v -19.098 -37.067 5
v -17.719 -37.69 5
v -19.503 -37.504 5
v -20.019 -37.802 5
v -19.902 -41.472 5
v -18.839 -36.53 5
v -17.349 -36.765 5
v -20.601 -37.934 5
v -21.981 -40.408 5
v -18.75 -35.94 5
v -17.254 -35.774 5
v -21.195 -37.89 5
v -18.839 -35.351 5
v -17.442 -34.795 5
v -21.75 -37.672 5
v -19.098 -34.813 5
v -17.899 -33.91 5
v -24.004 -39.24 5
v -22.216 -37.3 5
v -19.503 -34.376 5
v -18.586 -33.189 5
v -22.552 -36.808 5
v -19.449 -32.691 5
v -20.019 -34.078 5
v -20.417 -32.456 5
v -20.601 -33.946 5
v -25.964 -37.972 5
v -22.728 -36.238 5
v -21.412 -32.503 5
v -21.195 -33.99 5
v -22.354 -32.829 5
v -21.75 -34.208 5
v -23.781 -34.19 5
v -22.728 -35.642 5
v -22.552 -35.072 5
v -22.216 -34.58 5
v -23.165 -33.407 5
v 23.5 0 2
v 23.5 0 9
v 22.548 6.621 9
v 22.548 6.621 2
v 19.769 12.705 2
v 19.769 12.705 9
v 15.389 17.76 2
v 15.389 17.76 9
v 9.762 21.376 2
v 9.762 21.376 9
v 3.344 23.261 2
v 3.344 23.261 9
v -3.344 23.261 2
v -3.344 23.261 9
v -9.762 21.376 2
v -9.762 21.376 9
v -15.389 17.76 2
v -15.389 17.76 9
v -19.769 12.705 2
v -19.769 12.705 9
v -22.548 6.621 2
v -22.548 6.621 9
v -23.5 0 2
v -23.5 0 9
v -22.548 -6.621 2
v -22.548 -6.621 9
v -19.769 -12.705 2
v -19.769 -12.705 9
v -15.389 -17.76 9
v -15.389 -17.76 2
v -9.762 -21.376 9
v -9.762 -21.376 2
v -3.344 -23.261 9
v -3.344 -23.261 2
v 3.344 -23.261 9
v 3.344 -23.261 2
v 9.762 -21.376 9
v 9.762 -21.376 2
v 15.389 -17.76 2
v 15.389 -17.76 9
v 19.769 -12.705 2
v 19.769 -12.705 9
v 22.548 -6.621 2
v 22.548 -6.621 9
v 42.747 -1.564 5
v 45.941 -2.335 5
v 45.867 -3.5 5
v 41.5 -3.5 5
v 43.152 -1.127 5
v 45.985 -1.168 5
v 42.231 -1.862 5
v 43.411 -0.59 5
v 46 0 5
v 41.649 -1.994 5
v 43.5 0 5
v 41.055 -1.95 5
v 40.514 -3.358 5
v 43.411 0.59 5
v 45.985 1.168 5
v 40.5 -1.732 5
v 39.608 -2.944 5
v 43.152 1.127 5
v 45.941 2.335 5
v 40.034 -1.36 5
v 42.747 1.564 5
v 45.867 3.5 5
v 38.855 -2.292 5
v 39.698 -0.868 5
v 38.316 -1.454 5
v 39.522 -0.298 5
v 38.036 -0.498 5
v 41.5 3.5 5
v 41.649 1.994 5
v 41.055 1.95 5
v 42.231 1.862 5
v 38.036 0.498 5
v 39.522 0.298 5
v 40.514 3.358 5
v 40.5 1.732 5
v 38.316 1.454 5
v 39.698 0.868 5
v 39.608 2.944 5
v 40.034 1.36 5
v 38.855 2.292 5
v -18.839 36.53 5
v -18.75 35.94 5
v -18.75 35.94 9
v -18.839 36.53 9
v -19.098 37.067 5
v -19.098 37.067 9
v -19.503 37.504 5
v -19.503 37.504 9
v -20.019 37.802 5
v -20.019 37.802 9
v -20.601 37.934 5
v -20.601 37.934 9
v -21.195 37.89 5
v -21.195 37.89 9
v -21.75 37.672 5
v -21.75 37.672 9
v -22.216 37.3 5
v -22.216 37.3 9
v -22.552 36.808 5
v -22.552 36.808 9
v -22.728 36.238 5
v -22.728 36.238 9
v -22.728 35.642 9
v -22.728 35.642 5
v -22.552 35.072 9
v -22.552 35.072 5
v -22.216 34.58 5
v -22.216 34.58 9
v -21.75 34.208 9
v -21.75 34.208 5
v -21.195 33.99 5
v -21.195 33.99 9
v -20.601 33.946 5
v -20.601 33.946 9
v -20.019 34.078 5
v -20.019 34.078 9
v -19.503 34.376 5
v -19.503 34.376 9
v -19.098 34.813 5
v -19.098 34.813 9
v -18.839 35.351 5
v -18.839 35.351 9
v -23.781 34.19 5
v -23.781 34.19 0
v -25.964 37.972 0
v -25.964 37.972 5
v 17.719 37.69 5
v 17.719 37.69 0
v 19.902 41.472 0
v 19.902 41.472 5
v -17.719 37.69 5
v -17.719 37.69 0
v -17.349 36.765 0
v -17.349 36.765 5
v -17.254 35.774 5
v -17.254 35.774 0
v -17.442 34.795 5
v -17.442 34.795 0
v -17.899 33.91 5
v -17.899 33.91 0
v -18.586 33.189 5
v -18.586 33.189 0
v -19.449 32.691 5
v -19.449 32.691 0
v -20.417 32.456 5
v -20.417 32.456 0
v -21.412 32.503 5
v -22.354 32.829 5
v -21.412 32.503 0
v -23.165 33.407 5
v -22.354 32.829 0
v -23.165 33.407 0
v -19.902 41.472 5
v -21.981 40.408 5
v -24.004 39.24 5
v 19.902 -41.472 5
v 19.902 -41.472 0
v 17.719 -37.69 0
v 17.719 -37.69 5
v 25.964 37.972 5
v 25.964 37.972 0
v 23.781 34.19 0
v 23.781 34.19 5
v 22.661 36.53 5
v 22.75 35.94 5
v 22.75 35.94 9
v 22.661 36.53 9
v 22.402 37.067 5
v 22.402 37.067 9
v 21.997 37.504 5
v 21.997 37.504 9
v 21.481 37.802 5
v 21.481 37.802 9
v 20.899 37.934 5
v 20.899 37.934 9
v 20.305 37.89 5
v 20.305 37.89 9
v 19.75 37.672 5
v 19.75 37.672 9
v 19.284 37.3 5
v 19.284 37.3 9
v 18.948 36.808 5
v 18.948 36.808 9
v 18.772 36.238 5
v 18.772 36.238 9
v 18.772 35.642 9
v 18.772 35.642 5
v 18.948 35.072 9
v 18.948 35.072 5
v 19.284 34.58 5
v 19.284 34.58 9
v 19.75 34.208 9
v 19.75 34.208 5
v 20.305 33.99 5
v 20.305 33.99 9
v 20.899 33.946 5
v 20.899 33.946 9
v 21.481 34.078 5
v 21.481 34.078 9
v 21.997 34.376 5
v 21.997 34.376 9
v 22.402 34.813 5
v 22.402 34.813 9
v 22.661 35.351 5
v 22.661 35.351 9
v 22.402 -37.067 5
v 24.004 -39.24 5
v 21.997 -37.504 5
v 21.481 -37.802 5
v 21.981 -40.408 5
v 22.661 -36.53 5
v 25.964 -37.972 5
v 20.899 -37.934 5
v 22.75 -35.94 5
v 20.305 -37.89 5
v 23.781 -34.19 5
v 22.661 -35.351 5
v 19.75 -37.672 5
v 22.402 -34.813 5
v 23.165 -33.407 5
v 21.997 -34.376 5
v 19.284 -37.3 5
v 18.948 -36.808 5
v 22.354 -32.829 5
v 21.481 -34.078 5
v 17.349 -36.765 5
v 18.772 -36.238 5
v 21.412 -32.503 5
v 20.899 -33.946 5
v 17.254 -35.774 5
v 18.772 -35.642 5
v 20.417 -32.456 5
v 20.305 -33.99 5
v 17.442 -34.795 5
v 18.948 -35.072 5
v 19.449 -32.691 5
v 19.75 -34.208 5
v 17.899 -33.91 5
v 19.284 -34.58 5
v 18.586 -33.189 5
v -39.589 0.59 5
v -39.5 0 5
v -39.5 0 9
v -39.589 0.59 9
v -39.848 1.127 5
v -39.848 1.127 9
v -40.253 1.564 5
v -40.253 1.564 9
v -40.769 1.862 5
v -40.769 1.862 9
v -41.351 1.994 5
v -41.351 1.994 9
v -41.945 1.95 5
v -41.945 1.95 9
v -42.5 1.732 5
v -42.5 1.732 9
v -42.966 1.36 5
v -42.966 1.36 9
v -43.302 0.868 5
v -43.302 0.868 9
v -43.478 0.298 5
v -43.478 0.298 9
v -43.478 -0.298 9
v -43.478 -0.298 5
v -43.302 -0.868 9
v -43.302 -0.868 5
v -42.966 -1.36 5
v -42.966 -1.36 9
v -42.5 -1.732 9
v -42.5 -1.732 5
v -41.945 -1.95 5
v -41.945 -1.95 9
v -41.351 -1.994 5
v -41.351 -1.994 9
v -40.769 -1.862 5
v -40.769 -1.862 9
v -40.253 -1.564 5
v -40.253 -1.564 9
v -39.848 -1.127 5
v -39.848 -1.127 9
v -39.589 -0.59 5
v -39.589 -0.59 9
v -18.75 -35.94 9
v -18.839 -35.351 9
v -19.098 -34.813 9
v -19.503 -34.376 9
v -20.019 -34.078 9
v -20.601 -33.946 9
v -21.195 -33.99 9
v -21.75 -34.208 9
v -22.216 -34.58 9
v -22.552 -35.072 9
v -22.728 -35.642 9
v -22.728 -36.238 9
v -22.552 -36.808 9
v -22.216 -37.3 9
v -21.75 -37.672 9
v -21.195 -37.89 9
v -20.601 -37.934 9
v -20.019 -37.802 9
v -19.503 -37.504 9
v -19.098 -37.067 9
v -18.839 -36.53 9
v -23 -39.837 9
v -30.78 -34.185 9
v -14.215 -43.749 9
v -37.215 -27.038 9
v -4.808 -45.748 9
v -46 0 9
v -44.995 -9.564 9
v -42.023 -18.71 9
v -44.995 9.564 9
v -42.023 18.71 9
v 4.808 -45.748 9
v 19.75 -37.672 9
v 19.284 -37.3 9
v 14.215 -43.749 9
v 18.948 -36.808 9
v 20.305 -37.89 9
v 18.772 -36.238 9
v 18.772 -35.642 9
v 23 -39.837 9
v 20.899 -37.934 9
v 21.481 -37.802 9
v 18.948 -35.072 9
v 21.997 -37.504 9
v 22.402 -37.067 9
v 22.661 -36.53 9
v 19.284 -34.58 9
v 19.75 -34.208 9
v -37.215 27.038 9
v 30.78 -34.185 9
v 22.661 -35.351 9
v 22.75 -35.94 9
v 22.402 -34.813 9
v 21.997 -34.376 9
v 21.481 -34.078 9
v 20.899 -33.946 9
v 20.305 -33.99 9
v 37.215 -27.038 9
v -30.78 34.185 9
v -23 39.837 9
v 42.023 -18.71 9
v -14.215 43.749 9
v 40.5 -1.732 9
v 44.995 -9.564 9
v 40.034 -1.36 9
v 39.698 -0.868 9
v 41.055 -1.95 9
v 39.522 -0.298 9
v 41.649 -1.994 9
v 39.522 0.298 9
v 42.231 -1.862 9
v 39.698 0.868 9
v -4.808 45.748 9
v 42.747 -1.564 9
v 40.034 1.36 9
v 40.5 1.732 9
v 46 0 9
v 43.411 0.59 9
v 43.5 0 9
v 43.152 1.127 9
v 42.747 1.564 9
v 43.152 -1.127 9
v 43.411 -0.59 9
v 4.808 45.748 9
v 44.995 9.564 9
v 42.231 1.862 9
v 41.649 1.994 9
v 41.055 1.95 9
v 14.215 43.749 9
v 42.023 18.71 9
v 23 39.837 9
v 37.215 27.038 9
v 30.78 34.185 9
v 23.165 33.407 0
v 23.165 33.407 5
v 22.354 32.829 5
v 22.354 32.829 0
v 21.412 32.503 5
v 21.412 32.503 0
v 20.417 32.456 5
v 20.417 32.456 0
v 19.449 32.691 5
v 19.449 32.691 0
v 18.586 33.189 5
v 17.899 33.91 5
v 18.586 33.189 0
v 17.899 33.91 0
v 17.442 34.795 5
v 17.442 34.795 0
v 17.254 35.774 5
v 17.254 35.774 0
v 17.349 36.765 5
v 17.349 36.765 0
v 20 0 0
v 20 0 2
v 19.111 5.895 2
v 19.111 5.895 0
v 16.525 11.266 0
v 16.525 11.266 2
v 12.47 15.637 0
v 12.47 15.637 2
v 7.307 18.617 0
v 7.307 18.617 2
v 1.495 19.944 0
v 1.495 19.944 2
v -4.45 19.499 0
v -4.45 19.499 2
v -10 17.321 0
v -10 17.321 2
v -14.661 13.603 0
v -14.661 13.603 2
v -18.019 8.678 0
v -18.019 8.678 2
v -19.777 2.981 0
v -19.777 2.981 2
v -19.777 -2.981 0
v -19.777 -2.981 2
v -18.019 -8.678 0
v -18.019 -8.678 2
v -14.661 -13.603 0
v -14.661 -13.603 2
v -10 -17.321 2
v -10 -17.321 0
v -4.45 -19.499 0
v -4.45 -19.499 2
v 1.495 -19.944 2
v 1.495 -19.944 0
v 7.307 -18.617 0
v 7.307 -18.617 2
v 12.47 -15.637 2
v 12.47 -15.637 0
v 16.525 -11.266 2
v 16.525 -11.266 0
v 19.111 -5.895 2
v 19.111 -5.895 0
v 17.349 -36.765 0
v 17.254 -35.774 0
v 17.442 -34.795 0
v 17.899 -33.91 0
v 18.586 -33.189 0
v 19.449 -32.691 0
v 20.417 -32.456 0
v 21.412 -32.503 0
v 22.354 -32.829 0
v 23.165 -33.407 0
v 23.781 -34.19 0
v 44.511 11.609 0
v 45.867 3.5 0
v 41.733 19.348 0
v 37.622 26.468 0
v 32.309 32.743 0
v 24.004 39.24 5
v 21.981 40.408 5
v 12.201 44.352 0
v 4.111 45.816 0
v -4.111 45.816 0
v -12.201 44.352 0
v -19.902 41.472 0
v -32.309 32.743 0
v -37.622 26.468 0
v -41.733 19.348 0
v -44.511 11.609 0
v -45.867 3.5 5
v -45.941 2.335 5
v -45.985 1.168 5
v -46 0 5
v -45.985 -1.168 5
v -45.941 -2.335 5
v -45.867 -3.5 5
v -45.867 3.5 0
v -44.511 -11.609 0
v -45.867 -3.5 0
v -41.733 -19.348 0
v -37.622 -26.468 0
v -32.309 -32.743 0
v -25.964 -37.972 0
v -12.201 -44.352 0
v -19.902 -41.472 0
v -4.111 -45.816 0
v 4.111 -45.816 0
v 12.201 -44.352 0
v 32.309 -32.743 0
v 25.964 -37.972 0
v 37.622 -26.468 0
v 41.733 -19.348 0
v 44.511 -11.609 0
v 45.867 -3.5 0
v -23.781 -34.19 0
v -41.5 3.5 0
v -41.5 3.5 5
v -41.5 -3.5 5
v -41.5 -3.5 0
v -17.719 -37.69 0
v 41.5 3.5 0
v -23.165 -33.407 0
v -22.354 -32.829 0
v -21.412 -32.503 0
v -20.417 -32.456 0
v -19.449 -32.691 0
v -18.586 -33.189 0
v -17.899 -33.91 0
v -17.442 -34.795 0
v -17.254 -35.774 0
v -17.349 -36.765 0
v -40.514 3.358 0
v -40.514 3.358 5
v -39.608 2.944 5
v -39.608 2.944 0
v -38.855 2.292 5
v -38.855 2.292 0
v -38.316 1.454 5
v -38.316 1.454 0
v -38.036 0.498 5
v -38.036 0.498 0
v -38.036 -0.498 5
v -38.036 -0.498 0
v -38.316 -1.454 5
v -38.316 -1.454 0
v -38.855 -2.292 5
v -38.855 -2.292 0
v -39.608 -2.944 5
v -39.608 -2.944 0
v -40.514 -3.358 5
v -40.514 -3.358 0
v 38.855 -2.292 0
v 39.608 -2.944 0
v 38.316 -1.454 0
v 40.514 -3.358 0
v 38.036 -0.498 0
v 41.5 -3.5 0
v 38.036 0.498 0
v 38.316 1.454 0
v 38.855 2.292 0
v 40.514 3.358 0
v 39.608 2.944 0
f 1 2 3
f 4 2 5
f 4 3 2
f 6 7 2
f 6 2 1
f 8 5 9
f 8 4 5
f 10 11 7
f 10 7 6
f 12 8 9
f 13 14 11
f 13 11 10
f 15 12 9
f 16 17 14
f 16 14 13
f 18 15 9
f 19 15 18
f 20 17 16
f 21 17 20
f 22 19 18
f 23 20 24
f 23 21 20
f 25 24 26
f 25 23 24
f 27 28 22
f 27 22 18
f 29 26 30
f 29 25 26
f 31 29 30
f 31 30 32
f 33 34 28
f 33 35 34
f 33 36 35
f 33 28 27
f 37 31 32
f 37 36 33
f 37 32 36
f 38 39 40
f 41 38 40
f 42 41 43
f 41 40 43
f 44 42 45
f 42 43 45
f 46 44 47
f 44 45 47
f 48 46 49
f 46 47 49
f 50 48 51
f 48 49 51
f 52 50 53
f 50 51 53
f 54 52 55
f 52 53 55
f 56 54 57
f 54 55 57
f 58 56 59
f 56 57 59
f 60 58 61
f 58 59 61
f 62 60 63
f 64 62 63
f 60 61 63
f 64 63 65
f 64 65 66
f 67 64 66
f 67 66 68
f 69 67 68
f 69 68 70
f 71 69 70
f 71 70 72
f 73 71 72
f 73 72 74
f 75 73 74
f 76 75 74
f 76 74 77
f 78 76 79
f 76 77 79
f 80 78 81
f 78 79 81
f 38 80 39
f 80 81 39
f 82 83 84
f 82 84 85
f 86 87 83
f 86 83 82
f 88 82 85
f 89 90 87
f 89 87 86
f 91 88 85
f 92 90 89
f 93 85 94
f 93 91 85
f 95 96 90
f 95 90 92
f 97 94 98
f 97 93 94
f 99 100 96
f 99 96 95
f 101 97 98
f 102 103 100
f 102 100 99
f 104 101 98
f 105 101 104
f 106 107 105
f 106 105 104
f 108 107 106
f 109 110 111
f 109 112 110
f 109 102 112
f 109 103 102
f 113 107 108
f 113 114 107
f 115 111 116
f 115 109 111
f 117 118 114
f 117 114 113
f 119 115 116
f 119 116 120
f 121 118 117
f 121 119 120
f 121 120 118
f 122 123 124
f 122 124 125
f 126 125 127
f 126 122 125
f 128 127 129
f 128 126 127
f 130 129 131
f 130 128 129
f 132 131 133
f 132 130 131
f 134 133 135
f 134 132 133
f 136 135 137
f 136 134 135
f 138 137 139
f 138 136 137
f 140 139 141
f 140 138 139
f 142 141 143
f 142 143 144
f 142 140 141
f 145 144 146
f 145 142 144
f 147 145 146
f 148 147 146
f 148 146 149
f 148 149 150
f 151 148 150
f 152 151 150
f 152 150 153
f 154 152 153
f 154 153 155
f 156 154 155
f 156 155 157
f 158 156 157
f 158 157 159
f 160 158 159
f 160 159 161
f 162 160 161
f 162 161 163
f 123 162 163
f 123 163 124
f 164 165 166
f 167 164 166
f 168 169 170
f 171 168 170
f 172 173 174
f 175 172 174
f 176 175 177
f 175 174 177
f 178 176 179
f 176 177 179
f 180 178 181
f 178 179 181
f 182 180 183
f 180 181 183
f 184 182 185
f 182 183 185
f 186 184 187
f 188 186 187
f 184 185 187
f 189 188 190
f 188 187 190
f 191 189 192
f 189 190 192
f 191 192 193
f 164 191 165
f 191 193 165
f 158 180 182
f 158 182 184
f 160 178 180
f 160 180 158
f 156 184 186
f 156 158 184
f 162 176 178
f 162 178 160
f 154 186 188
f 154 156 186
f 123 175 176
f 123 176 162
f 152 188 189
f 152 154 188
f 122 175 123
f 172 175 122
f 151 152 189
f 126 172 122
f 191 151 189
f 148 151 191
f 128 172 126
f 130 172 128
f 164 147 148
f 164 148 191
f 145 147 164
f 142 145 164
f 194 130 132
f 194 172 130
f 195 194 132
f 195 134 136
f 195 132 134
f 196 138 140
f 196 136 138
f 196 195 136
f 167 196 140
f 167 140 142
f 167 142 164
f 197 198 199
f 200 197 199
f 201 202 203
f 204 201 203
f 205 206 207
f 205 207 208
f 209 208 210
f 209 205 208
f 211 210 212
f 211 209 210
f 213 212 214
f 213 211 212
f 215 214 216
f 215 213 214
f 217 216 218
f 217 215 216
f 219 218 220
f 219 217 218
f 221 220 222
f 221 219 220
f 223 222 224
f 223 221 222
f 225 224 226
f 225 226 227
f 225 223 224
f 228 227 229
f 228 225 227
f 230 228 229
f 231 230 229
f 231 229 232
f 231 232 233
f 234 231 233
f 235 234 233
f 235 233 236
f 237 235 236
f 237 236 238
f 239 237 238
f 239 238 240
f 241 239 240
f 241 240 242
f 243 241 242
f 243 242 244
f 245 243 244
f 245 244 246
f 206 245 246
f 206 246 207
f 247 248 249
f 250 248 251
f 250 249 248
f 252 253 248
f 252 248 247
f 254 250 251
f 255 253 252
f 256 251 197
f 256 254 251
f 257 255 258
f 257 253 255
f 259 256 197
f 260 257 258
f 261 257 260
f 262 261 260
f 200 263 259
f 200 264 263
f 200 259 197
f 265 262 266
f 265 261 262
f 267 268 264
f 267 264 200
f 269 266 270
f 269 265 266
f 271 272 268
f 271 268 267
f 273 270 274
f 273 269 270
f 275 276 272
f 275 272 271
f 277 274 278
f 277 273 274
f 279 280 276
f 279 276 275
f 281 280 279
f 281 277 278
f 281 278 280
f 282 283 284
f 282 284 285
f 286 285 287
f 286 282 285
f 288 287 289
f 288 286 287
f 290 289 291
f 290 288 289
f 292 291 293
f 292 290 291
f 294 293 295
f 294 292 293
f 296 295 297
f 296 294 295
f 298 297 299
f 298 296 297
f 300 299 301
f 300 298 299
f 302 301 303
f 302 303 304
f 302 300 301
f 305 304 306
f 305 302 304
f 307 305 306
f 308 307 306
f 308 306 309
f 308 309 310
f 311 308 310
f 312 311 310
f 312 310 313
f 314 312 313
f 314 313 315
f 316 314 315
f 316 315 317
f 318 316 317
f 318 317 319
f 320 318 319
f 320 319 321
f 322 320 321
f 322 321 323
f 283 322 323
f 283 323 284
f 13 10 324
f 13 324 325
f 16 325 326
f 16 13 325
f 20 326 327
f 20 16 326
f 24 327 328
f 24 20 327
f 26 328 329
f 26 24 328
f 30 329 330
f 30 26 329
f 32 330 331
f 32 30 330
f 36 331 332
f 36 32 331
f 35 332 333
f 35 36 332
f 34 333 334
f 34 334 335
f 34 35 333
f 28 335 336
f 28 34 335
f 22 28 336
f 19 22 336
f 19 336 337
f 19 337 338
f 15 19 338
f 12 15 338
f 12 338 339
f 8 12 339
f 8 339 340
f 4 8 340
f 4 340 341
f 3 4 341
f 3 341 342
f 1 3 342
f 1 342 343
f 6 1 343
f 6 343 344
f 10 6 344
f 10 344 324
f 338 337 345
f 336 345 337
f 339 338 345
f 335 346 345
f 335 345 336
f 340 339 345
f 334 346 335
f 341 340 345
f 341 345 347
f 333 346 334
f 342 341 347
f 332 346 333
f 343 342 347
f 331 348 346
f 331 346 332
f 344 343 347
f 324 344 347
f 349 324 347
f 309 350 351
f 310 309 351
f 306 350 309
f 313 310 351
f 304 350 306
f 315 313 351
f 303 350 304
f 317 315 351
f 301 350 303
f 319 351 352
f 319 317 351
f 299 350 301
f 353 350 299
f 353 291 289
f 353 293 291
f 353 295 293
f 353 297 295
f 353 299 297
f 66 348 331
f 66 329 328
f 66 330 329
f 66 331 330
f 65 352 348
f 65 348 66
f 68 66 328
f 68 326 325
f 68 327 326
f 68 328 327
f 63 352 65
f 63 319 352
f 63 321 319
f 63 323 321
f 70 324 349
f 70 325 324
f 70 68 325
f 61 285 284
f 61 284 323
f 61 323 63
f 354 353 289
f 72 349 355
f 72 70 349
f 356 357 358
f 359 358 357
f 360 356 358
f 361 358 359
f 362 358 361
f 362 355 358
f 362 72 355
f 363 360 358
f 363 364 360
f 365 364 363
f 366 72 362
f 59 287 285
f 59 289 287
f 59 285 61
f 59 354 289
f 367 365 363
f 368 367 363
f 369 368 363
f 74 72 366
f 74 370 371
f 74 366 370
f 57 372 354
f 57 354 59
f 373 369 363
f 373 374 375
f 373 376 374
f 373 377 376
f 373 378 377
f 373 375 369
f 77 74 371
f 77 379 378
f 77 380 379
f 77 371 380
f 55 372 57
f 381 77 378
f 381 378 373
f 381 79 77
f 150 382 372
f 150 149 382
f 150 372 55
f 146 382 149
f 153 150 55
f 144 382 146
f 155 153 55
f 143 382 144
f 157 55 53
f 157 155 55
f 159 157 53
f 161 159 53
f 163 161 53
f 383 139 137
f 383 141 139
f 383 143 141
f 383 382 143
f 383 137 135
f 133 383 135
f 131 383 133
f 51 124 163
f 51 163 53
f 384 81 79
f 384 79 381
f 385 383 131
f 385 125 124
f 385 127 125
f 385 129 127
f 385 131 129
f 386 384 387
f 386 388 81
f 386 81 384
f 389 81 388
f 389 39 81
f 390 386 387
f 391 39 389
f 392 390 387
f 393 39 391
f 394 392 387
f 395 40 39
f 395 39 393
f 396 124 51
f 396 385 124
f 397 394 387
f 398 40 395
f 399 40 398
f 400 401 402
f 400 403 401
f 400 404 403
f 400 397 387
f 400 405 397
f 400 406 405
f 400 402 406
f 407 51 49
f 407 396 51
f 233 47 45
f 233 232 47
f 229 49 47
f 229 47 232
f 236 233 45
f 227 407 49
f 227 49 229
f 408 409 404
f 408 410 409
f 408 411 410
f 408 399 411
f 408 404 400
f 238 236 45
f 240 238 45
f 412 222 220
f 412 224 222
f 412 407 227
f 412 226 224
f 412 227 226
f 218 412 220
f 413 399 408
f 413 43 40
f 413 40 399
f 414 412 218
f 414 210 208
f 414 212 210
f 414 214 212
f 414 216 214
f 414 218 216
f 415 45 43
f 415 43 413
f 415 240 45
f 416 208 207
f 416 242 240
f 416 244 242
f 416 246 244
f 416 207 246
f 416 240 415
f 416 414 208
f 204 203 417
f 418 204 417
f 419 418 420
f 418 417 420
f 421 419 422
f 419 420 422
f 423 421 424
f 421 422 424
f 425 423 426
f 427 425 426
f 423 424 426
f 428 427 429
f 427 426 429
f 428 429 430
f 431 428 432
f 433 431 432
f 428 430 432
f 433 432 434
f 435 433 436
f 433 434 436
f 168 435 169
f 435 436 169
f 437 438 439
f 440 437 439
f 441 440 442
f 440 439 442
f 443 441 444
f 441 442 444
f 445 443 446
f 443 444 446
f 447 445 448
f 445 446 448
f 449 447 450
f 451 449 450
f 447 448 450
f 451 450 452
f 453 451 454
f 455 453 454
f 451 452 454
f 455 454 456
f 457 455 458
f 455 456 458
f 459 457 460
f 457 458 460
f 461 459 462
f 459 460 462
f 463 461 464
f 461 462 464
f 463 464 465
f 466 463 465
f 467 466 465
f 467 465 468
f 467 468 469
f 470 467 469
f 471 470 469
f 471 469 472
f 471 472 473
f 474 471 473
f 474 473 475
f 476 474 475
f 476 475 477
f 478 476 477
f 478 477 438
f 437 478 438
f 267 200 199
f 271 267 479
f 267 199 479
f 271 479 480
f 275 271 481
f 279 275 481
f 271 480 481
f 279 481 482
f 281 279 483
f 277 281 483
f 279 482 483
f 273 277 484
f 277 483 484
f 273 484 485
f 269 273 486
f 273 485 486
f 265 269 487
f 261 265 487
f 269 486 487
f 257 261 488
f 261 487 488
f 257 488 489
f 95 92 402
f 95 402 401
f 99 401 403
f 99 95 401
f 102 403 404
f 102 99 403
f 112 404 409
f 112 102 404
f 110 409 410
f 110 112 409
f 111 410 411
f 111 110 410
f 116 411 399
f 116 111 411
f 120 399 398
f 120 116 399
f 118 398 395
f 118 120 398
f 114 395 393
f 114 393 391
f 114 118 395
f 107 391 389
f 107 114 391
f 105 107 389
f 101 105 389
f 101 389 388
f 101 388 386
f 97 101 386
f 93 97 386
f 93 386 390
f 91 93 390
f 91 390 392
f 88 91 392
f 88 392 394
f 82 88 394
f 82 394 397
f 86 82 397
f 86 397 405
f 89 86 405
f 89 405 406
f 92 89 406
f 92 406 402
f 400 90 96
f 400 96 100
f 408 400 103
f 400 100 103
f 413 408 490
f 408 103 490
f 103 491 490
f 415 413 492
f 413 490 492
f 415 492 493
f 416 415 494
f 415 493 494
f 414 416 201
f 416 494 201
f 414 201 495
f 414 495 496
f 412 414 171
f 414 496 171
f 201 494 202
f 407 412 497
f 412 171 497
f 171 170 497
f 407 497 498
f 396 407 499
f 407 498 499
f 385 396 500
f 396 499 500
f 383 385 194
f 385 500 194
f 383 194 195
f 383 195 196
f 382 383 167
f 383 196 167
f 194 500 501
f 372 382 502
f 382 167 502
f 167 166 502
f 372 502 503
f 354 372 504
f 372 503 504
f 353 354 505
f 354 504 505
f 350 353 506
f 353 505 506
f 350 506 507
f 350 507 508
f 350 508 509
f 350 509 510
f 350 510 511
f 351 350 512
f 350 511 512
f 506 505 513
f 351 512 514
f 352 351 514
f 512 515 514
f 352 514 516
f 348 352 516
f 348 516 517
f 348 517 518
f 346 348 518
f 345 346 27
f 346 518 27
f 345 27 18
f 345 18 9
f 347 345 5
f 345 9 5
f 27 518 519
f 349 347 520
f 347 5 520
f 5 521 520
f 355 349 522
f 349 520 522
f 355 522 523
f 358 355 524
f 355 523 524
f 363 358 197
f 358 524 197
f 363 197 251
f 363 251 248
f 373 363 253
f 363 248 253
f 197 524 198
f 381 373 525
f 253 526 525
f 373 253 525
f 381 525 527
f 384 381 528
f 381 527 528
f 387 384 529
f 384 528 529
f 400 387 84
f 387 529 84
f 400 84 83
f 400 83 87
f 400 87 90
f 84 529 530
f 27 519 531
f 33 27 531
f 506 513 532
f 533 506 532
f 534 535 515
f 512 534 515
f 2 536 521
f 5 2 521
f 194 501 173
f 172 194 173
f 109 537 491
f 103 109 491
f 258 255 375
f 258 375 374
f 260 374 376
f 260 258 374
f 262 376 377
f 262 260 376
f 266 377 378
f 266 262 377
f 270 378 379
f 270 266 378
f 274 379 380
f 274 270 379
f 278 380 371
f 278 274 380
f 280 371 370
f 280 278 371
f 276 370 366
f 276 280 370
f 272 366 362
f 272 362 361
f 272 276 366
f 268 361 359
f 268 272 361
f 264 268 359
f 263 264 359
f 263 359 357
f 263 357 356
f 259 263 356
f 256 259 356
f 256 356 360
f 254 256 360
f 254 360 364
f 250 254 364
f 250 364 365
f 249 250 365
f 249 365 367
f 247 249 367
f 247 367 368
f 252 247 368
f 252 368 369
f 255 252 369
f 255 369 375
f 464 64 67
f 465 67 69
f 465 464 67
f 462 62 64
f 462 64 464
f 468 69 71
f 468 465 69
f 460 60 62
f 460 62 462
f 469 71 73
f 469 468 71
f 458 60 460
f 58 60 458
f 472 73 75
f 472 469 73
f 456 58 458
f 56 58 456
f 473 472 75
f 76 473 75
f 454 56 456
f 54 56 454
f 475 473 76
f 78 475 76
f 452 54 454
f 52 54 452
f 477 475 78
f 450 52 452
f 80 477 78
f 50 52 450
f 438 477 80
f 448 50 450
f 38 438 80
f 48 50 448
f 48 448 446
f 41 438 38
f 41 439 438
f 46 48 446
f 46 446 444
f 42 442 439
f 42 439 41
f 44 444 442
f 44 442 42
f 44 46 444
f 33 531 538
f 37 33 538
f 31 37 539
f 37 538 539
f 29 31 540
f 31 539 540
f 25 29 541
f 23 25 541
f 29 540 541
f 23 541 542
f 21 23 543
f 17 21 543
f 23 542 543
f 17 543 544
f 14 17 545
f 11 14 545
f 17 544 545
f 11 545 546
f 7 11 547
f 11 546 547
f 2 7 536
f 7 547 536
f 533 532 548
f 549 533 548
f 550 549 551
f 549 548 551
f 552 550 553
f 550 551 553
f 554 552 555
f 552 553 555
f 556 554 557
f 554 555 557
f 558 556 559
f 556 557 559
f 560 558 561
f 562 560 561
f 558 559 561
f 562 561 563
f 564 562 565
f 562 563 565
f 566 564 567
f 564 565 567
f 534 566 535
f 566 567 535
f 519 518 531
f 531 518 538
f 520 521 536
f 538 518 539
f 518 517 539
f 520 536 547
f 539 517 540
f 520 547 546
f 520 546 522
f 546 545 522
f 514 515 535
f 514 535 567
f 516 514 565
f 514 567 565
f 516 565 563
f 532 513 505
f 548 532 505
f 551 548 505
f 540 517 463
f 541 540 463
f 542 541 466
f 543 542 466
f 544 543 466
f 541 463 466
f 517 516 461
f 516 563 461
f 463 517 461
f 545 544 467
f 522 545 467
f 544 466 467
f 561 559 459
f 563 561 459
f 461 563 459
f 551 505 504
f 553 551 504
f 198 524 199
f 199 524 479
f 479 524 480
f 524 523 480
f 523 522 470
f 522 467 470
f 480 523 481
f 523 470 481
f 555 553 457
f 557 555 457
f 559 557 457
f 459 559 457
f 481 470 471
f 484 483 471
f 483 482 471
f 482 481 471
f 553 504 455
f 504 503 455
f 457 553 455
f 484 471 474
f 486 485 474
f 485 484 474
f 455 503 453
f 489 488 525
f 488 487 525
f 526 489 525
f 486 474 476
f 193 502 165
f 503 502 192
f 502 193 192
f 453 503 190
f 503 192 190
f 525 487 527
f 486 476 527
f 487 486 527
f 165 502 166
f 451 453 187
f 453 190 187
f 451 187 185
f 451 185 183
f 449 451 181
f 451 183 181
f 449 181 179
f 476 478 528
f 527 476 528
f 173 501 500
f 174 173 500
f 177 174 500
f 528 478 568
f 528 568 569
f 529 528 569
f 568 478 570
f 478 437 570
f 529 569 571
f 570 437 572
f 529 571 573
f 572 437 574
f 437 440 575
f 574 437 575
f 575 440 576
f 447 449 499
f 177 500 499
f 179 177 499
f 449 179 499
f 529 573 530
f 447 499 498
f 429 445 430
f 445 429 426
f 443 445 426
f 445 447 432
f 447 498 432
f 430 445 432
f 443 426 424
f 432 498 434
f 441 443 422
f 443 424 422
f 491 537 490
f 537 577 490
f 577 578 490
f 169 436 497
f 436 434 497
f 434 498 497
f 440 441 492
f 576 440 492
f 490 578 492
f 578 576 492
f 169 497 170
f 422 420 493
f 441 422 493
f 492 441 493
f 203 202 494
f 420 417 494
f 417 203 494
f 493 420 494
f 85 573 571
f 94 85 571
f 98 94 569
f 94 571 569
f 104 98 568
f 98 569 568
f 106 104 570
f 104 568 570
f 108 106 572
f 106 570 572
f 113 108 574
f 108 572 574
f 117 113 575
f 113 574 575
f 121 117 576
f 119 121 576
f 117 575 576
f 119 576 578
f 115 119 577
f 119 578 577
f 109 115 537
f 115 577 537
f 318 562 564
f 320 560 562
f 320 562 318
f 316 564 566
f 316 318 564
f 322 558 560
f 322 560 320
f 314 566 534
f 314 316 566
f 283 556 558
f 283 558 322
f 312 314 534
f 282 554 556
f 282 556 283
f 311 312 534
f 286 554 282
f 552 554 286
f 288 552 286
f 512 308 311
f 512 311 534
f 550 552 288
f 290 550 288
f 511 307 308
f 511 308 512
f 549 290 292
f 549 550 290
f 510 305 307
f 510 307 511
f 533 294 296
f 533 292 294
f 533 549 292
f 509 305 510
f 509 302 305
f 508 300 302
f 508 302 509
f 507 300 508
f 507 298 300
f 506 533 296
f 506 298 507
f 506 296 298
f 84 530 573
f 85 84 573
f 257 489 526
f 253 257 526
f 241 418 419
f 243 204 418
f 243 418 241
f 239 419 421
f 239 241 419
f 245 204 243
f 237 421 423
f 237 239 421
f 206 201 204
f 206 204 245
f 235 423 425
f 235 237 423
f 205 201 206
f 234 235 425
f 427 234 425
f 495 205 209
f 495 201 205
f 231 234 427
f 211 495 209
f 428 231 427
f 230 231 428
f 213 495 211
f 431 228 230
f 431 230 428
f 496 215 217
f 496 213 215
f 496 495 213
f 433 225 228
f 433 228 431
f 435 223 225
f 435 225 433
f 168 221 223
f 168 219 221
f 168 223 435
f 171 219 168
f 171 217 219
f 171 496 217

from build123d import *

# Parameters (mm, degrees)
SKETCH1_R           = 46
SKETCH1_R_2         = 2
BOSS_EXTRUDE1_DEPTH = 9
SKETCH2_R           = 23.5
CUT_EXTRUDE1_DEPTH  = 7
SKETCH3_R           = 20
CUT_EXTRUDE2_DEPTH  = 66.429351212
SKETCH4_R           = 3.5
CUT_EXTRUDE3_DEPTH  = 5
CUT_EXTRUDE4_DEPTH  = 5


with BuildPart() as part:
    # Sketch1 → Boss-Extrude1 (new body)
    with BuildSketch(Plane.XY):
        Circle(SKETCH1_R)
        with Locations((41.5, 0)):
            Circle(SKETCH1_R_2, mode=Mode.SUBTRACT)
        with Locations((20.75, -35.940054257)):
            Circle(SKETCH1_R_2, mode=Mode.SUBTRACT)
        with Locations((-20.75, -35.940054257)):
            Circle(SKETCH1_R_2, mode=Mode.SUBTRACT)
        with Locations((-41.5, 0)):
            Circle(SKETCH1_R_2, mode=Mode.SUBTRACT)
        with Locations((-20.75, 35.940054257)):
            Circle(SKETCH1_R_2, mode=Mode.SUBTRACT)
        with Locations((20.75, 35.940054257)):
            Circle(SKETCH1_R_2, mode=Mode.SUBTRACT)
    extrude(amount=BOSS_EXTRUDE1_DEPTH)

    # Sketch2 → Cut-Extrude1 (cut)
    with BuildSketch(Plane.XY.offset(9)):
        Circle(SKETCH2_R)
    extrude(amount=-CUT_EXTRUDE1_DEPTH, mode=Mode.SUBTRACT)

    # Sketch3 → Cut-Extrude2 (cut, through all)
    with BuildSketch(Plane.XY.offset(2)):
        Circle(SKETCH3_R)
    extrude(amount=-CUT_EXTRUDE2_DEPTH, mode=Mode.SUBTRACT)

    # Sketch4 → Cut-Extrude3 (cut)
    with BuildSketch(Plane(origin=(0, 0, 0), x_dir=(-1, 0, 0), z_dir=(0, 0, -1))):
        with Locations((-20.75, 35.940054257)):
            Circle(SKETCH4_R)
        with Locations((20.75, 35.940054257)):
            Circle(SKETCH4_R)
        with Locations((41.5, 0)):
            Circle(SKETCH4_R)
        with Locations((20.75, -35.940054257)):
            Circle(SKETCH4_R)
        with Locations((-20.75, -35.940054257)):
            Circle(SKETCH4_R)
        with Locations((-41.5, 0)):
            Circle(SKETCH4_R)
    extrude(amount=-CUT_EXTRUDE3_DEPTH, mode=Mode.SUBTRACT)

    # Sketch5 → Cut-Extrude4 (cut)
    with BuildSketch(Plane(origin=(0, 0, 0), x_dir=(-1, 0, 0), z_dir=(0, 0, -1))):
        with BuildLine():
            ThreePointArc((-23.781088913, 34.190054257), (-22.5, 38.97114317), (-17.718911087, 37.690054257))
            Line((-17.718911087, 37.690054257), (-19.902238364, 41.471688031))
            ThreePointArc((-19.902238364, 41.471688031), (-23, 39.837168574), (-25.96441619, 37.971688031))
            Line((-25.96441619, 37.971688031), (-23.781088913, 34.190054257))
        make_face()
        with BuildLine():
            ThreePointArc((25.96441619, 37.971688031), (23, 39.837168574), (19.902238364, 41.471688031))
            Line((19.902238364, 41.471688031), (17.718911087, 37.690054257))
            ThreePointArc((17.718911087, 37.690054257), (22.5, 38.97114317), (23.781088913, 34.190054257))
            Line((23.781088913, 34.190054257), (25.96441619, 37.971688031))
        make_face()
        with BuildLine():
            Line((-41.5, 3.5), (-45.866654554, 3.5))
            ThreePointArc((-45.866654554, 3.5), (-46, 0), (-45.866654554, -3.5))
            Line((-45.866654554, -3.5), (-41.5, -3.5))
            ThreePointArc((-41.5, -3.5), (-45, 0), (-41.5, 3.5))
        make_face()
        with BuildLine():
            ThreePointArc((45.866654554, -3.5), (46, 0), (45.866654554, 3.5))
            Line((45.866654554, 3.5), (41.5, 3.5))
            ThreePointArc((41.5, 3.5), (45, 0), (41.5, -3.5))
            Line((41.5, -3.5), (45.866654554, -3.5))
        make_face()
        with BuildLine():
            Line((-23.781088913, -34.190054257), (-25.96441619, -37.971688031))
            ThreePointArc((-25.96441619, -37.971688031), (-23, -39.837168574), (-19.902238364, -41.471688031))
            Line((-19.902238364, -41.471688031), (-17.718911087, -37.690054257))
            ThreePointArc((-17.718911087, -37.690054257), (-22.5, -38.97114317), (-23.781088913, -34.190054257))
        make_face()
        with BuildLine():
            Line((17.718911087, -37.690054257), (19.902238364, -41.471688031))
            ThreePointArc((19.902238364, -41.471688031), (23, -39.837168574), (25.96441619, -37.971688031))
            Line((25.96441619, -37.971688031), (23.781088913, -34.190054257))
            ThreePointArc((23.781088913, -34.190054257), (22.5, -38.97114317), (17.718911087, -37.690054257))
        make_face()
    extrude(amount=-CUT_EXTRUDE4_DEPTH, mode=Mode.SUBTRACT)


solid = part.part
